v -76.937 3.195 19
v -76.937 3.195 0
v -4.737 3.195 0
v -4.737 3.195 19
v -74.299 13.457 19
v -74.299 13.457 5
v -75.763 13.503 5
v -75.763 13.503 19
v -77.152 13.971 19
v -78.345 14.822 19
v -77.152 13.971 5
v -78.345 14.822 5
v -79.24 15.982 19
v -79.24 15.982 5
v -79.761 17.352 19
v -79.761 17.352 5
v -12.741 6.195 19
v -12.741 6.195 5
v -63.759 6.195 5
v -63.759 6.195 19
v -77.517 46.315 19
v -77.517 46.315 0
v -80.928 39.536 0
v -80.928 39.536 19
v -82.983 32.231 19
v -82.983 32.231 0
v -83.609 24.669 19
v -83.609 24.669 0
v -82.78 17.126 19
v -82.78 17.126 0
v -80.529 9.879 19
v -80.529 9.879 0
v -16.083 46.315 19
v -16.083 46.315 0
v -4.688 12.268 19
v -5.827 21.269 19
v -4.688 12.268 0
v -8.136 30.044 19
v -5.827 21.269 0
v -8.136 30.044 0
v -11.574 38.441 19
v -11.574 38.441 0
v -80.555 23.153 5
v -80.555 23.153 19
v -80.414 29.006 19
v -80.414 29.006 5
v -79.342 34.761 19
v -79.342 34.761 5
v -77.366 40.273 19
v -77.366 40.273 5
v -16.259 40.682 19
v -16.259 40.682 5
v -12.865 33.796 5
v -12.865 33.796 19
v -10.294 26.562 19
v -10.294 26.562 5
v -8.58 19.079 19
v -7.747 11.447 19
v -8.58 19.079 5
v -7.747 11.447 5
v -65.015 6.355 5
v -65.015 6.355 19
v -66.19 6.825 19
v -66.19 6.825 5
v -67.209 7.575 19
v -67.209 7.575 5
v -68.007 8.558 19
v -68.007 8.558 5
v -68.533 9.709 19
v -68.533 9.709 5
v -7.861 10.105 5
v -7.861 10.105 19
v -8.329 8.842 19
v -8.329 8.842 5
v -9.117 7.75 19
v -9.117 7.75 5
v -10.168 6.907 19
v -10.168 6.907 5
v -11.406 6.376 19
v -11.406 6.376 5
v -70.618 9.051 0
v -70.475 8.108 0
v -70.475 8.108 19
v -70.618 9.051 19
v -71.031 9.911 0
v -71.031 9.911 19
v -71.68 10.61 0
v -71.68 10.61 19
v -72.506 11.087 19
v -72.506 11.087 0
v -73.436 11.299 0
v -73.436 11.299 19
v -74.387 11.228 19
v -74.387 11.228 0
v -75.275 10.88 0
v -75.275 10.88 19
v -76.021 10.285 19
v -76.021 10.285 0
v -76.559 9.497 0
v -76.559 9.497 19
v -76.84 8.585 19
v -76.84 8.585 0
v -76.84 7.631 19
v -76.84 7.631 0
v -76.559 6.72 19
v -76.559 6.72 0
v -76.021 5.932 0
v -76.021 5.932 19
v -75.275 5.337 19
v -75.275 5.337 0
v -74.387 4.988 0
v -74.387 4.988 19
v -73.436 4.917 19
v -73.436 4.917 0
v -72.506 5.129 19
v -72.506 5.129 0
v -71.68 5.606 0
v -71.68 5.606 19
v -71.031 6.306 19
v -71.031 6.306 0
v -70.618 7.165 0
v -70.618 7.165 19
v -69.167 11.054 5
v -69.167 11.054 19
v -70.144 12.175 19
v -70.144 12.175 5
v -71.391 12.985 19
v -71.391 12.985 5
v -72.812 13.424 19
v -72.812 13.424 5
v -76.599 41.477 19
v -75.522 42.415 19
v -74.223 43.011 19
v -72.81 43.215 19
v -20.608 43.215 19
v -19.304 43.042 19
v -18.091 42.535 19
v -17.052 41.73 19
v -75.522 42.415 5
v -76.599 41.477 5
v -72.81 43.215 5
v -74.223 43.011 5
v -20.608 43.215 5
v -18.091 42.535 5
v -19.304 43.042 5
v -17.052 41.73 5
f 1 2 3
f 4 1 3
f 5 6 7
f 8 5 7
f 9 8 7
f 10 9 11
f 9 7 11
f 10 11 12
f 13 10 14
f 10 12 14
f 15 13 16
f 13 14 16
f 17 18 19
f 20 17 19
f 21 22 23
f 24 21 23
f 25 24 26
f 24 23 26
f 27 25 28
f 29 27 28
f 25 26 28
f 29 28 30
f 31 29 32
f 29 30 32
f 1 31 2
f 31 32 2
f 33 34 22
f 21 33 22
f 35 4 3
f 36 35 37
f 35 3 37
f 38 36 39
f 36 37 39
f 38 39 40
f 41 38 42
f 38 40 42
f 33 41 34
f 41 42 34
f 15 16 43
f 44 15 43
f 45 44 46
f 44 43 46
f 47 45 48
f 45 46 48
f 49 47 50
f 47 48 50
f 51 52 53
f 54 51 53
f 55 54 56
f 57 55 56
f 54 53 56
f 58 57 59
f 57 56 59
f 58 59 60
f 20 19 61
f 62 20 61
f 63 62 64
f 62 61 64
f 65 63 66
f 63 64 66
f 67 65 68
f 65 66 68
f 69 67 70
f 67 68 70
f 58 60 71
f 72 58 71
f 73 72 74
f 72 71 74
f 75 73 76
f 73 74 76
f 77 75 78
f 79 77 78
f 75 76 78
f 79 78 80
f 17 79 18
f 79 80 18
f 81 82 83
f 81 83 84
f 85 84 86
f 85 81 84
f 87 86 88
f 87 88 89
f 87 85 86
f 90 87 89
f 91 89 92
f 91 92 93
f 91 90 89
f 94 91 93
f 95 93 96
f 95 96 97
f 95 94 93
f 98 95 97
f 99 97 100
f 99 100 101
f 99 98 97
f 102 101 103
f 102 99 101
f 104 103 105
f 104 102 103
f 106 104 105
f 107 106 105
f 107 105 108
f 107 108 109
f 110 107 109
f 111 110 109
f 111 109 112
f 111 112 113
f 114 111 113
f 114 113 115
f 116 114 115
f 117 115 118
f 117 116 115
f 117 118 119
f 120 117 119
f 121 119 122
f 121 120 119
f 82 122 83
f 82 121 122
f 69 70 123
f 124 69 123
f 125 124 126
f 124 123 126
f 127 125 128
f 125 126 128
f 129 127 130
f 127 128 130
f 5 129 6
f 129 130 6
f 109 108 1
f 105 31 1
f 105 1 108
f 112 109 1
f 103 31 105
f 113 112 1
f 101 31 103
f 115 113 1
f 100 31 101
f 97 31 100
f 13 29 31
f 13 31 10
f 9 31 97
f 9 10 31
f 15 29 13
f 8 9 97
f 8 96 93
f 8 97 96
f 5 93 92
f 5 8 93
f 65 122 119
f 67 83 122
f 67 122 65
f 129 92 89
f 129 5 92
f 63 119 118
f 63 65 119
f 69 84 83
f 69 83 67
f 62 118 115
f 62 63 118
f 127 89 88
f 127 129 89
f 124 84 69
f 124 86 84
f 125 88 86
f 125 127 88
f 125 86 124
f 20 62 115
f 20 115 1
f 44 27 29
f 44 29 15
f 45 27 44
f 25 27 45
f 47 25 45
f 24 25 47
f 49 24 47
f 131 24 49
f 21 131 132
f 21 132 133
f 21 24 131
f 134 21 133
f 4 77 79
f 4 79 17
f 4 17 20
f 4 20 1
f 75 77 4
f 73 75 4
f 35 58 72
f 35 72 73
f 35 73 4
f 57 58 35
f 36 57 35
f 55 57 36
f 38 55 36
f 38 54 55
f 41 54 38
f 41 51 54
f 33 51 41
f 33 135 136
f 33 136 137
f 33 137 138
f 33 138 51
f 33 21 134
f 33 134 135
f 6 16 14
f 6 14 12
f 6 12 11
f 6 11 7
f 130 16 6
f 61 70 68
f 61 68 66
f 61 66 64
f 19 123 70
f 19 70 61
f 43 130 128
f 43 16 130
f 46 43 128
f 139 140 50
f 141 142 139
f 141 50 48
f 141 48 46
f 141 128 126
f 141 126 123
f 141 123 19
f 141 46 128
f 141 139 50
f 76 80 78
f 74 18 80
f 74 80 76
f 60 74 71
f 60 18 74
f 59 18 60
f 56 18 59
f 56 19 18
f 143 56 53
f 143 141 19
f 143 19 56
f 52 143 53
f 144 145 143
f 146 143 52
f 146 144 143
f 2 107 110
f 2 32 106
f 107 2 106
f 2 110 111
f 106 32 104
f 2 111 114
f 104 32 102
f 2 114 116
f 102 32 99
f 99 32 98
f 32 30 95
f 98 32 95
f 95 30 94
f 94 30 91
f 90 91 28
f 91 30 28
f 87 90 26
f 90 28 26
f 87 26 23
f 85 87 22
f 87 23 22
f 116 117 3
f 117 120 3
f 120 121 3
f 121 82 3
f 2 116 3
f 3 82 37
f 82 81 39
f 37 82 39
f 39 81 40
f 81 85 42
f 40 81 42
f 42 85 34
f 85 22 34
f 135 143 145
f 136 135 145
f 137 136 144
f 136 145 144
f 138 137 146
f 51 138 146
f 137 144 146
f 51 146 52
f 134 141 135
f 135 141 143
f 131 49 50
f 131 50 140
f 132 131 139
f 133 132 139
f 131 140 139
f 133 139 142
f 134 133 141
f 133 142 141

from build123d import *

# Parameters (mm, degrees)
F0_R     = 3.2
F1_DEPTH = 19
F2_DEPTH = 5


with BuildPart() as f1:
    # F0 (on Top) → F1 (new body)
    with BuildSketch(Plane.XY):
        with BuildLine():
            Line((-16.083093, 46.314633), (-77.51673, 46.314633))
            ThreePointArc((-77.51673, 46.314633), (-83.608573, 24.668741), (-76.936605, 3.194569))
            Line((-76.936605, 3.194569), (-4.737342, 3.194569))
            ThreePointArc((-4.737342, 3.194569), (-6.8374, 25.694681), (-16.083093, 46.314633))
        make_face()
        with Locations((-73.675402, 8.108267)):
            Circle(F0_R, mode=Mode.SUBTRACT)
        with BuildLine():
            ThreePointArc((-77.366346, 40.272824), (-75.521531, 42.415285), (-72.809609, 43.214634))
            Line((-72.809609, 43.214634), (-20.607641, 43.214634))
            ThreePointArc((-20.607641, 43.214634), (-18.091299, 42.535285), (-16.258748, 40.681845))
            ThreePointArc((-16.258748, 40.681845), (-10.294291, 26.562128), (-7.746958, 11.447491))
            ThreePointArc((-7.746958, 11.447491), (-9.116704, 7.749617), (-12.740557, 6.194569))
            Line((-12.740557, 6.194569), (-63.759234, 6.194569))
            ThreePointArc((-63.759234, 6.194569), (-66.72323, 7.167817), (-68.533345, 9.708678))
            ThreePointArc((-68.533345, 9.708678), (-70.739665, 12.623078), (-74.298513, 13.457453))
            ThreePointArc((-74.298513, 13.457453), (-77.779678, 14.352671), (-79.760766, 17.351873))
            ThreePointArc((-79.760766, 17.351873), (-80.414005, 29.005654), (-77.366346, 40.272824))
        make_face(mode=Mode.SUBTRACT)
    extrude(amount=F1_DEPTH)

    # F0 (on Top) → F2 (join)
    with BuildSketch(Plane.XY):
        with BuildLine():
            Line((-20.607641, 43.214634), (-72.809609, 43.214634))
            ThreePointArc((-72.809609, 43.214634), (-75.521531, 42.415285), (-77.366346, 40.272824))
            ThreePointArc((-77.366346, 40.272824), (-80.414005, 29.005654), (-79.760766, 17.351873))
            ThreePointArc((-79.760766, 17.351873), (-77.779678, 14.352671), (-74.298513, 13.457453))
            ThreePointArc((-74.298513, 13.457453), (-70.739665, 12.623078), (-68.533345, 9.708678))
            ThreePointArc((-68.533345, 9.708678), (-66.72323, 7.167817), (-63.759234, 6.194569))
            Line((-63.759234, 6.194569), (-12.740557, 6.194569))
            ThreePointArc((-12.740557, 6.194569), (-9.116704, 7.749617), (-7.746958, 11.447491))
            ThreePointArc((-7.746958, 11.447491), (-10.294291, 26.562128), (-16.258748, 40.681845))
            ThreePointArc((-16.258748, 40.681845), (-18.091299, 42.535285), (-20.607641, 43.214634))
        make_face()
    extrude(amount=F2_DEPTH)


solid = f1.part
